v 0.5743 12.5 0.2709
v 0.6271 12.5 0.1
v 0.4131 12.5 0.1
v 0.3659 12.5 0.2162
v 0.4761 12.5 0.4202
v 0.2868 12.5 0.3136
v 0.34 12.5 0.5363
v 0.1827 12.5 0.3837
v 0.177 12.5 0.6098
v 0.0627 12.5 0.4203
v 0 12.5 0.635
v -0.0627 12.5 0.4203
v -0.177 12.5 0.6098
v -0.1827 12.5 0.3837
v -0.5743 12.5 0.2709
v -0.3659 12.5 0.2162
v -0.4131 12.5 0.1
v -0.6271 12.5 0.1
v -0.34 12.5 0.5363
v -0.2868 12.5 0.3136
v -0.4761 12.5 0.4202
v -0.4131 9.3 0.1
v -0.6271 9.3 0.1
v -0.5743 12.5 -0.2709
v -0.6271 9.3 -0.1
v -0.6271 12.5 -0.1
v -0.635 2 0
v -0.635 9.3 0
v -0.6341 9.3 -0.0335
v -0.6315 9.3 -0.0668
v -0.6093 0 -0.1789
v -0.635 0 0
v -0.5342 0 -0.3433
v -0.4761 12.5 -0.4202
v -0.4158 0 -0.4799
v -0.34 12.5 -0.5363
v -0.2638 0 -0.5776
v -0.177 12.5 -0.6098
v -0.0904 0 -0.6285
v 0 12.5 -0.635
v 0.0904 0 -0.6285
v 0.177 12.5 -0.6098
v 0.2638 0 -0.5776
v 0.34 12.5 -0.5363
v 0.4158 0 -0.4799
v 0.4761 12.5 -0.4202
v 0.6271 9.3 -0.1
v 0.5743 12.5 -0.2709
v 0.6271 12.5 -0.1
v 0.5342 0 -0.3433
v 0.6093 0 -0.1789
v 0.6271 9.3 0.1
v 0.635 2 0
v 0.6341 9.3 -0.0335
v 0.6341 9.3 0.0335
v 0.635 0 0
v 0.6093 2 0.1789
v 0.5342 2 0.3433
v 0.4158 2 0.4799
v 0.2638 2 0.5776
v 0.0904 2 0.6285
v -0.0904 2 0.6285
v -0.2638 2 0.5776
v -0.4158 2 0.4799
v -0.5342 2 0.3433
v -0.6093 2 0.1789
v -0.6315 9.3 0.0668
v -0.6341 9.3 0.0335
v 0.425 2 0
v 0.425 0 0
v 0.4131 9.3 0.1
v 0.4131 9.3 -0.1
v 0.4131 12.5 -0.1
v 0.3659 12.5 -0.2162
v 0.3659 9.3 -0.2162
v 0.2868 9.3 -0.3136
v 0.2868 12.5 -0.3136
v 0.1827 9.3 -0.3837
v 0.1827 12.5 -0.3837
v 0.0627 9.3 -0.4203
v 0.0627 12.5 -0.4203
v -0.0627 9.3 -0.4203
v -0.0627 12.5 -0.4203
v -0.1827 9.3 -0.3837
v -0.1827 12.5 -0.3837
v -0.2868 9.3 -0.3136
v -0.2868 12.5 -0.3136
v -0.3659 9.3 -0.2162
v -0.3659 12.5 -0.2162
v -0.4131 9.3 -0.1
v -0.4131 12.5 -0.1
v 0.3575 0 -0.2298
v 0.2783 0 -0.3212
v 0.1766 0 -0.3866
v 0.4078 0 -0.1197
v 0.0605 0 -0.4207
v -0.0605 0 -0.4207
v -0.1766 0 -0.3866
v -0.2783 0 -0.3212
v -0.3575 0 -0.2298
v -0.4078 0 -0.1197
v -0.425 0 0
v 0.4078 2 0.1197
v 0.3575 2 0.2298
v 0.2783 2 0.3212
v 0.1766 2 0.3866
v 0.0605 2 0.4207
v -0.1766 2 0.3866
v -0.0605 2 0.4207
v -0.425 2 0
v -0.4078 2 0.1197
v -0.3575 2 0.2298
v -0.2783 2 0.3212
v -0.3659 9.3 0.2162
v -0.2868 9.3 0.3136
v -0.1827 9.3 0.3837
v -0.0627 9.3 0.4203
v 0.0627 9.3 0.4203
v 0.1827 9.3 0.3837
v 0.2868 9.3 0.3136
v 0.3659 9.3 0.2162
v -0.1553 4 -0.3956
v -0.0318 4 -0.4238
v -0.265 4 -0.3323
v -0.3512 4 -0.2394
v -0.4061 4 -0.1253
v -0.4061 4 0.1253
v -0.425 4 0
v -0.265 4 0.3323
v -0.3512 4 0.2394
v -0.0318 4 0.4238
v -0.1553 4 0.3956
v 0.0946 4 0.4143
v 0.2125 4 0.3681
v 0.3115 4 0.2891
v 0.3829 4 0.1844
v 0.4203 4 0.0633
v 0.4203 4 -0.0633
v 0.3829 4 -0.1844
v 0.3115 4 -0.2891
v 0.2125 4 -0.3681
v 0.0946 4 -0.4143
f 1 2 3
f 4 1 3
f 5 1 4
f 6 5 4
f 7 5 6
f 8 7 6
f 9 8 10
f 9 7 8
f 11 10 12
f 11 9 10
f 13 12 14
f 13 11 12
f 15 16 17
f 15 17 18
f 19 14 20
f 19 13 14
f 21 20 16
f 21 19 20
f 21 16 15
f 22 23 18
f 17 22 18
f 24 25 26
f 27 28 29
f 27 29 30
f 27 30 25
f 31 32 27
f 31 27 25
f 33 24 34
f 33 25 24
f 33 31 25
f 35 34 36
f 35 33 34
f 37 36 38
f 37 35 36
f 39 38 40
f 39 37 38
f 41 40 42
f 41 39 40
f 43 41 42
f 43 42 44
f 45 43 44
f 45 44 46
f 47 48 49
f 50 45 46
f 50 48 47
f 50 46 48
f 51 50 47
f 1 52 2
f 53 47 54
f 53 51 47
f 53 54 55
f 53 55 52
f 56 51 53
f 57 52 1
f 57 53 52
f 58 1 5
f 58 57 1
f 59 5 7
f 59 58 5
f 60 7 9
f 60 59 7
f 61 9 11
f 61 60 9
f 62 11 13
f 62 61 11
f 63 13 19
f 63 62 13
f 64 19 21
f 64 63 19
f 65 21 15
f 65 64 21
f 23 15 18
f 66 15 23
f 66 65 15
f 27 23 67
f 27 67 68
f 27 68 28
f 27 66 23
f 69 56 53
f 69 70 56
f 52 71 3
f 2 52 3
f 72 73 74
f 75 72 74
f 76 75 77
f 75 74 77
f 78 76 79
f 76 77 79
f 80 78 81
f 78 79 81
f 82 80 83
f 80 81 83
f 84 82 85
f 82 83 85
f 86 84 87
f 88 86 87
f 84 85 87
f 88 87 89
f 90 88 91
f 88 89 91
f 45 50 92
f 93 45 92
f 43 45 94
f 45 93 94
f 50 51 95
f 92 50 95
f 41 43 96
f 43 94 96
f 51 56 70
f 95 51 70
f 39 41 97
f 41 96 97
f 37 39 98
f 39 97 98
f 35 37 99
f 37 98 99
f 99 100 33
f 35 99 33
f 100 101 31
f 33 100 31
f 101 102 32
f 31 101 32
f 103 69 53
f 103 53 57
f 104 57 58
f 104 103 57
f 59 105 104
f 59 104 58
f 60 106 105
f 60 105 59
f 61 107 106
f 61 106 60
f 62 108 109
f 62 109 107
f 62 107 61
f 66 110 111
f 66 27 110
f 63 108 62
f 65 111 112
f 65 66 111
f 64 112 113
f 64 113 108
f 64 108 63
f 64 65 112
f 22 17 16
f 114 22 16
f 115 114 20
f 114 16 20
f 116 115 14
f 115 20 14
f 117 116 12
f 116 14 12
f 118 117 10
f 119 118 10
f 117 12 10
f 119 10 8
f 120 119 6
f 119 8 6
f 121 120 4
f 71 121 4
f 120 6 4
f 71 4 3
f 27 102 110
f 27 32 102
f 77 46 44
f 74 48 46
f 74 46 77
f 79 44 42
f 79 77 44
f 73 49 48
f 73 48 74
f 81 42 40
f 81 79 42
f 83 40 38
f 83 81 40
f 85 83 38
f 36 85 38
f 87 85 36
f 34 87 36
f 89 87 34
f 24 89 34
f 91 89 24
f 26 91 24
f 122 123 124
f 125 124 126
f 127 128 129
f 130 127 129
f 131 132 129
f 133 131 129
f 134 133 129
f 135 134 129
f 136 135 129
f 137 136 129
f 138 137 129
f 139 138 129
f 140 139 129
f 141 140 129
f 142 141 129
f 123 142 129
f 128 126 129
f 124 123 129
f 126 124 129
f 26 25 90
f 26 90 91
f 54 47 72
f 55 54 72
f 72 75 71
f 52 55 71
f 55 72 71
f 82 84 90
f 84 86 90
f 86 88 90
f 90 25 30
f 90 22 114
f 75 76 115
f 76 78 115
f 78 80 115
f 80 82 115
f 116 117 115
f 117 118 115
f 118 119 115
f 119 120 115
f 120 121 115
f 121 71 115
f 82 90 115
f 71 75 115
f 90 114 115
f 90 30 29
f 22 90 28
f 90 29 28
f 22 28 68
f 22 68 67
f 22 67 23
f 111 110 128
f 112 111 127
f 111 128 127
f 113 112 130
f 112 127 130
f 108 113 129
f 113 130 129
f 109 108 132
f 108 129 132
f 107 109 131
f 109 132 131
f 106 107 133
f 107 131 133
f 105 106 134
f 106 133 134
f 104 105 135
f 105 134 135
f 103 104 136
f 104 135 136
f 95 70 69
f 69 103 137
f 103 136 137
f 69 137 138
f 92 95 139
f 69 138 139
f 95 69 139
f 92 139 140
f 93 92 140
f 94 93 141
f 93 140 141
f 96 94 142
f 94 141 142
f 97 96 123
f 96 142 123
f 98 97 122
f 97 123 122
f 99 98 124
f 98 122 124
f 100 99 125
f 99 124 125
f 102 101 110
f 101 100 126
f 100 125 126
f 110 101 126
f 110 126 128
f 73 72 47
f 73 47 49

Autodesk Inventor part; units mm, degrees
ref_plane "YZ Plane" through (0, 0, 0) normal (1, 0, 0) x (0, 1, 0)
ref_plane "XZ Plane" through (0, 0, 0) normal (0, 1, 0) x (-1, 0, 0)
ref_plane "XY Plane" through (0, 0, 0) normal (0, 0, 1) x (1, 0, 0)
sketch "Sketch1" plane through (0, 0, 0) normal (0, 0, 1) x (1, 0, 0)
  line L0 (0, 9.3) -> (-0.425, 9.3)
  line L1 (-0.425, 9.3) -> (-0.425, 12.5)
  line L2 (-0.425, 12.5) -> (-0.635, 12.5)
  line L3 (-0.635, 12.5) -> (-0.635, 0)
  line L4 (-0.635, 0) -> (-0.425, 0)
  line L5 (-0.425, 0) -> (-0.425, 4)
  line L6 (-0.425, 4) -> (0, 4)
  line L7 (0, 4) -> (0, 9.3)
  point P0 (0, 0)
  dimension "d0" = 0.635
  dimension "d1" = 12.5
  dimension "d2" = 4
  dimension "d3" = 3.2
  dimension "d4" = 0.425
revolve "Revolution1" add sketch "Sketch1" angle 360 about axis through (0, 4, 0) along (0, 1, 0)
sketch "Sketch2" plane through (0, 0, 0) normal (1, 0, 0) x (0, 1, 0)
  line L0 (9.3, -0.425) -> (9.3, 0.425) projected
  line L1 (9.3, -0.1) -> (12.5, -0.1)
  line L2 (12.5, -0.425) -> (12.5, 0.425) projected
  line L3 (9.3, 0.1) -> (12.5, 0.1)
  line L4 (9.3, -0.1) -> (9.3, 0.1)
  line L5 (12.5, -0.1) -> (12.5, 0.1)
  point P0 (0, 0)
  dimension "d6" = 0.2
  dimension "d7" = 0.1
extrude "Extrusion1" cut sketch "Sketch2" along normal through all both and the other way through all
sketch "Sketch3" plane through (0, 0, 0) normal (1, 0, 0) x (0, 1, 0)
  line L0 (0, 0) -> (2, 0)
  line L1 (0, 0.635) -> (12.5, 0.635) projected
  line L2 (2, 0) -> (2, 0.635)
  line L3 (0, -0.635) -> (0, 0.635) projected
  line L4 (0, 0) -> (0, 0.635)
  line L5 (2, 0.635) -> (0, 0.635)
  dimension "d10" = 2
extrude "Extrusion2" cut sketch "Sketch3" along normal through all both and the other way through all
properties part number "SMA-PanelMount-Ni-AuPlated-Pin" material "Brass"
